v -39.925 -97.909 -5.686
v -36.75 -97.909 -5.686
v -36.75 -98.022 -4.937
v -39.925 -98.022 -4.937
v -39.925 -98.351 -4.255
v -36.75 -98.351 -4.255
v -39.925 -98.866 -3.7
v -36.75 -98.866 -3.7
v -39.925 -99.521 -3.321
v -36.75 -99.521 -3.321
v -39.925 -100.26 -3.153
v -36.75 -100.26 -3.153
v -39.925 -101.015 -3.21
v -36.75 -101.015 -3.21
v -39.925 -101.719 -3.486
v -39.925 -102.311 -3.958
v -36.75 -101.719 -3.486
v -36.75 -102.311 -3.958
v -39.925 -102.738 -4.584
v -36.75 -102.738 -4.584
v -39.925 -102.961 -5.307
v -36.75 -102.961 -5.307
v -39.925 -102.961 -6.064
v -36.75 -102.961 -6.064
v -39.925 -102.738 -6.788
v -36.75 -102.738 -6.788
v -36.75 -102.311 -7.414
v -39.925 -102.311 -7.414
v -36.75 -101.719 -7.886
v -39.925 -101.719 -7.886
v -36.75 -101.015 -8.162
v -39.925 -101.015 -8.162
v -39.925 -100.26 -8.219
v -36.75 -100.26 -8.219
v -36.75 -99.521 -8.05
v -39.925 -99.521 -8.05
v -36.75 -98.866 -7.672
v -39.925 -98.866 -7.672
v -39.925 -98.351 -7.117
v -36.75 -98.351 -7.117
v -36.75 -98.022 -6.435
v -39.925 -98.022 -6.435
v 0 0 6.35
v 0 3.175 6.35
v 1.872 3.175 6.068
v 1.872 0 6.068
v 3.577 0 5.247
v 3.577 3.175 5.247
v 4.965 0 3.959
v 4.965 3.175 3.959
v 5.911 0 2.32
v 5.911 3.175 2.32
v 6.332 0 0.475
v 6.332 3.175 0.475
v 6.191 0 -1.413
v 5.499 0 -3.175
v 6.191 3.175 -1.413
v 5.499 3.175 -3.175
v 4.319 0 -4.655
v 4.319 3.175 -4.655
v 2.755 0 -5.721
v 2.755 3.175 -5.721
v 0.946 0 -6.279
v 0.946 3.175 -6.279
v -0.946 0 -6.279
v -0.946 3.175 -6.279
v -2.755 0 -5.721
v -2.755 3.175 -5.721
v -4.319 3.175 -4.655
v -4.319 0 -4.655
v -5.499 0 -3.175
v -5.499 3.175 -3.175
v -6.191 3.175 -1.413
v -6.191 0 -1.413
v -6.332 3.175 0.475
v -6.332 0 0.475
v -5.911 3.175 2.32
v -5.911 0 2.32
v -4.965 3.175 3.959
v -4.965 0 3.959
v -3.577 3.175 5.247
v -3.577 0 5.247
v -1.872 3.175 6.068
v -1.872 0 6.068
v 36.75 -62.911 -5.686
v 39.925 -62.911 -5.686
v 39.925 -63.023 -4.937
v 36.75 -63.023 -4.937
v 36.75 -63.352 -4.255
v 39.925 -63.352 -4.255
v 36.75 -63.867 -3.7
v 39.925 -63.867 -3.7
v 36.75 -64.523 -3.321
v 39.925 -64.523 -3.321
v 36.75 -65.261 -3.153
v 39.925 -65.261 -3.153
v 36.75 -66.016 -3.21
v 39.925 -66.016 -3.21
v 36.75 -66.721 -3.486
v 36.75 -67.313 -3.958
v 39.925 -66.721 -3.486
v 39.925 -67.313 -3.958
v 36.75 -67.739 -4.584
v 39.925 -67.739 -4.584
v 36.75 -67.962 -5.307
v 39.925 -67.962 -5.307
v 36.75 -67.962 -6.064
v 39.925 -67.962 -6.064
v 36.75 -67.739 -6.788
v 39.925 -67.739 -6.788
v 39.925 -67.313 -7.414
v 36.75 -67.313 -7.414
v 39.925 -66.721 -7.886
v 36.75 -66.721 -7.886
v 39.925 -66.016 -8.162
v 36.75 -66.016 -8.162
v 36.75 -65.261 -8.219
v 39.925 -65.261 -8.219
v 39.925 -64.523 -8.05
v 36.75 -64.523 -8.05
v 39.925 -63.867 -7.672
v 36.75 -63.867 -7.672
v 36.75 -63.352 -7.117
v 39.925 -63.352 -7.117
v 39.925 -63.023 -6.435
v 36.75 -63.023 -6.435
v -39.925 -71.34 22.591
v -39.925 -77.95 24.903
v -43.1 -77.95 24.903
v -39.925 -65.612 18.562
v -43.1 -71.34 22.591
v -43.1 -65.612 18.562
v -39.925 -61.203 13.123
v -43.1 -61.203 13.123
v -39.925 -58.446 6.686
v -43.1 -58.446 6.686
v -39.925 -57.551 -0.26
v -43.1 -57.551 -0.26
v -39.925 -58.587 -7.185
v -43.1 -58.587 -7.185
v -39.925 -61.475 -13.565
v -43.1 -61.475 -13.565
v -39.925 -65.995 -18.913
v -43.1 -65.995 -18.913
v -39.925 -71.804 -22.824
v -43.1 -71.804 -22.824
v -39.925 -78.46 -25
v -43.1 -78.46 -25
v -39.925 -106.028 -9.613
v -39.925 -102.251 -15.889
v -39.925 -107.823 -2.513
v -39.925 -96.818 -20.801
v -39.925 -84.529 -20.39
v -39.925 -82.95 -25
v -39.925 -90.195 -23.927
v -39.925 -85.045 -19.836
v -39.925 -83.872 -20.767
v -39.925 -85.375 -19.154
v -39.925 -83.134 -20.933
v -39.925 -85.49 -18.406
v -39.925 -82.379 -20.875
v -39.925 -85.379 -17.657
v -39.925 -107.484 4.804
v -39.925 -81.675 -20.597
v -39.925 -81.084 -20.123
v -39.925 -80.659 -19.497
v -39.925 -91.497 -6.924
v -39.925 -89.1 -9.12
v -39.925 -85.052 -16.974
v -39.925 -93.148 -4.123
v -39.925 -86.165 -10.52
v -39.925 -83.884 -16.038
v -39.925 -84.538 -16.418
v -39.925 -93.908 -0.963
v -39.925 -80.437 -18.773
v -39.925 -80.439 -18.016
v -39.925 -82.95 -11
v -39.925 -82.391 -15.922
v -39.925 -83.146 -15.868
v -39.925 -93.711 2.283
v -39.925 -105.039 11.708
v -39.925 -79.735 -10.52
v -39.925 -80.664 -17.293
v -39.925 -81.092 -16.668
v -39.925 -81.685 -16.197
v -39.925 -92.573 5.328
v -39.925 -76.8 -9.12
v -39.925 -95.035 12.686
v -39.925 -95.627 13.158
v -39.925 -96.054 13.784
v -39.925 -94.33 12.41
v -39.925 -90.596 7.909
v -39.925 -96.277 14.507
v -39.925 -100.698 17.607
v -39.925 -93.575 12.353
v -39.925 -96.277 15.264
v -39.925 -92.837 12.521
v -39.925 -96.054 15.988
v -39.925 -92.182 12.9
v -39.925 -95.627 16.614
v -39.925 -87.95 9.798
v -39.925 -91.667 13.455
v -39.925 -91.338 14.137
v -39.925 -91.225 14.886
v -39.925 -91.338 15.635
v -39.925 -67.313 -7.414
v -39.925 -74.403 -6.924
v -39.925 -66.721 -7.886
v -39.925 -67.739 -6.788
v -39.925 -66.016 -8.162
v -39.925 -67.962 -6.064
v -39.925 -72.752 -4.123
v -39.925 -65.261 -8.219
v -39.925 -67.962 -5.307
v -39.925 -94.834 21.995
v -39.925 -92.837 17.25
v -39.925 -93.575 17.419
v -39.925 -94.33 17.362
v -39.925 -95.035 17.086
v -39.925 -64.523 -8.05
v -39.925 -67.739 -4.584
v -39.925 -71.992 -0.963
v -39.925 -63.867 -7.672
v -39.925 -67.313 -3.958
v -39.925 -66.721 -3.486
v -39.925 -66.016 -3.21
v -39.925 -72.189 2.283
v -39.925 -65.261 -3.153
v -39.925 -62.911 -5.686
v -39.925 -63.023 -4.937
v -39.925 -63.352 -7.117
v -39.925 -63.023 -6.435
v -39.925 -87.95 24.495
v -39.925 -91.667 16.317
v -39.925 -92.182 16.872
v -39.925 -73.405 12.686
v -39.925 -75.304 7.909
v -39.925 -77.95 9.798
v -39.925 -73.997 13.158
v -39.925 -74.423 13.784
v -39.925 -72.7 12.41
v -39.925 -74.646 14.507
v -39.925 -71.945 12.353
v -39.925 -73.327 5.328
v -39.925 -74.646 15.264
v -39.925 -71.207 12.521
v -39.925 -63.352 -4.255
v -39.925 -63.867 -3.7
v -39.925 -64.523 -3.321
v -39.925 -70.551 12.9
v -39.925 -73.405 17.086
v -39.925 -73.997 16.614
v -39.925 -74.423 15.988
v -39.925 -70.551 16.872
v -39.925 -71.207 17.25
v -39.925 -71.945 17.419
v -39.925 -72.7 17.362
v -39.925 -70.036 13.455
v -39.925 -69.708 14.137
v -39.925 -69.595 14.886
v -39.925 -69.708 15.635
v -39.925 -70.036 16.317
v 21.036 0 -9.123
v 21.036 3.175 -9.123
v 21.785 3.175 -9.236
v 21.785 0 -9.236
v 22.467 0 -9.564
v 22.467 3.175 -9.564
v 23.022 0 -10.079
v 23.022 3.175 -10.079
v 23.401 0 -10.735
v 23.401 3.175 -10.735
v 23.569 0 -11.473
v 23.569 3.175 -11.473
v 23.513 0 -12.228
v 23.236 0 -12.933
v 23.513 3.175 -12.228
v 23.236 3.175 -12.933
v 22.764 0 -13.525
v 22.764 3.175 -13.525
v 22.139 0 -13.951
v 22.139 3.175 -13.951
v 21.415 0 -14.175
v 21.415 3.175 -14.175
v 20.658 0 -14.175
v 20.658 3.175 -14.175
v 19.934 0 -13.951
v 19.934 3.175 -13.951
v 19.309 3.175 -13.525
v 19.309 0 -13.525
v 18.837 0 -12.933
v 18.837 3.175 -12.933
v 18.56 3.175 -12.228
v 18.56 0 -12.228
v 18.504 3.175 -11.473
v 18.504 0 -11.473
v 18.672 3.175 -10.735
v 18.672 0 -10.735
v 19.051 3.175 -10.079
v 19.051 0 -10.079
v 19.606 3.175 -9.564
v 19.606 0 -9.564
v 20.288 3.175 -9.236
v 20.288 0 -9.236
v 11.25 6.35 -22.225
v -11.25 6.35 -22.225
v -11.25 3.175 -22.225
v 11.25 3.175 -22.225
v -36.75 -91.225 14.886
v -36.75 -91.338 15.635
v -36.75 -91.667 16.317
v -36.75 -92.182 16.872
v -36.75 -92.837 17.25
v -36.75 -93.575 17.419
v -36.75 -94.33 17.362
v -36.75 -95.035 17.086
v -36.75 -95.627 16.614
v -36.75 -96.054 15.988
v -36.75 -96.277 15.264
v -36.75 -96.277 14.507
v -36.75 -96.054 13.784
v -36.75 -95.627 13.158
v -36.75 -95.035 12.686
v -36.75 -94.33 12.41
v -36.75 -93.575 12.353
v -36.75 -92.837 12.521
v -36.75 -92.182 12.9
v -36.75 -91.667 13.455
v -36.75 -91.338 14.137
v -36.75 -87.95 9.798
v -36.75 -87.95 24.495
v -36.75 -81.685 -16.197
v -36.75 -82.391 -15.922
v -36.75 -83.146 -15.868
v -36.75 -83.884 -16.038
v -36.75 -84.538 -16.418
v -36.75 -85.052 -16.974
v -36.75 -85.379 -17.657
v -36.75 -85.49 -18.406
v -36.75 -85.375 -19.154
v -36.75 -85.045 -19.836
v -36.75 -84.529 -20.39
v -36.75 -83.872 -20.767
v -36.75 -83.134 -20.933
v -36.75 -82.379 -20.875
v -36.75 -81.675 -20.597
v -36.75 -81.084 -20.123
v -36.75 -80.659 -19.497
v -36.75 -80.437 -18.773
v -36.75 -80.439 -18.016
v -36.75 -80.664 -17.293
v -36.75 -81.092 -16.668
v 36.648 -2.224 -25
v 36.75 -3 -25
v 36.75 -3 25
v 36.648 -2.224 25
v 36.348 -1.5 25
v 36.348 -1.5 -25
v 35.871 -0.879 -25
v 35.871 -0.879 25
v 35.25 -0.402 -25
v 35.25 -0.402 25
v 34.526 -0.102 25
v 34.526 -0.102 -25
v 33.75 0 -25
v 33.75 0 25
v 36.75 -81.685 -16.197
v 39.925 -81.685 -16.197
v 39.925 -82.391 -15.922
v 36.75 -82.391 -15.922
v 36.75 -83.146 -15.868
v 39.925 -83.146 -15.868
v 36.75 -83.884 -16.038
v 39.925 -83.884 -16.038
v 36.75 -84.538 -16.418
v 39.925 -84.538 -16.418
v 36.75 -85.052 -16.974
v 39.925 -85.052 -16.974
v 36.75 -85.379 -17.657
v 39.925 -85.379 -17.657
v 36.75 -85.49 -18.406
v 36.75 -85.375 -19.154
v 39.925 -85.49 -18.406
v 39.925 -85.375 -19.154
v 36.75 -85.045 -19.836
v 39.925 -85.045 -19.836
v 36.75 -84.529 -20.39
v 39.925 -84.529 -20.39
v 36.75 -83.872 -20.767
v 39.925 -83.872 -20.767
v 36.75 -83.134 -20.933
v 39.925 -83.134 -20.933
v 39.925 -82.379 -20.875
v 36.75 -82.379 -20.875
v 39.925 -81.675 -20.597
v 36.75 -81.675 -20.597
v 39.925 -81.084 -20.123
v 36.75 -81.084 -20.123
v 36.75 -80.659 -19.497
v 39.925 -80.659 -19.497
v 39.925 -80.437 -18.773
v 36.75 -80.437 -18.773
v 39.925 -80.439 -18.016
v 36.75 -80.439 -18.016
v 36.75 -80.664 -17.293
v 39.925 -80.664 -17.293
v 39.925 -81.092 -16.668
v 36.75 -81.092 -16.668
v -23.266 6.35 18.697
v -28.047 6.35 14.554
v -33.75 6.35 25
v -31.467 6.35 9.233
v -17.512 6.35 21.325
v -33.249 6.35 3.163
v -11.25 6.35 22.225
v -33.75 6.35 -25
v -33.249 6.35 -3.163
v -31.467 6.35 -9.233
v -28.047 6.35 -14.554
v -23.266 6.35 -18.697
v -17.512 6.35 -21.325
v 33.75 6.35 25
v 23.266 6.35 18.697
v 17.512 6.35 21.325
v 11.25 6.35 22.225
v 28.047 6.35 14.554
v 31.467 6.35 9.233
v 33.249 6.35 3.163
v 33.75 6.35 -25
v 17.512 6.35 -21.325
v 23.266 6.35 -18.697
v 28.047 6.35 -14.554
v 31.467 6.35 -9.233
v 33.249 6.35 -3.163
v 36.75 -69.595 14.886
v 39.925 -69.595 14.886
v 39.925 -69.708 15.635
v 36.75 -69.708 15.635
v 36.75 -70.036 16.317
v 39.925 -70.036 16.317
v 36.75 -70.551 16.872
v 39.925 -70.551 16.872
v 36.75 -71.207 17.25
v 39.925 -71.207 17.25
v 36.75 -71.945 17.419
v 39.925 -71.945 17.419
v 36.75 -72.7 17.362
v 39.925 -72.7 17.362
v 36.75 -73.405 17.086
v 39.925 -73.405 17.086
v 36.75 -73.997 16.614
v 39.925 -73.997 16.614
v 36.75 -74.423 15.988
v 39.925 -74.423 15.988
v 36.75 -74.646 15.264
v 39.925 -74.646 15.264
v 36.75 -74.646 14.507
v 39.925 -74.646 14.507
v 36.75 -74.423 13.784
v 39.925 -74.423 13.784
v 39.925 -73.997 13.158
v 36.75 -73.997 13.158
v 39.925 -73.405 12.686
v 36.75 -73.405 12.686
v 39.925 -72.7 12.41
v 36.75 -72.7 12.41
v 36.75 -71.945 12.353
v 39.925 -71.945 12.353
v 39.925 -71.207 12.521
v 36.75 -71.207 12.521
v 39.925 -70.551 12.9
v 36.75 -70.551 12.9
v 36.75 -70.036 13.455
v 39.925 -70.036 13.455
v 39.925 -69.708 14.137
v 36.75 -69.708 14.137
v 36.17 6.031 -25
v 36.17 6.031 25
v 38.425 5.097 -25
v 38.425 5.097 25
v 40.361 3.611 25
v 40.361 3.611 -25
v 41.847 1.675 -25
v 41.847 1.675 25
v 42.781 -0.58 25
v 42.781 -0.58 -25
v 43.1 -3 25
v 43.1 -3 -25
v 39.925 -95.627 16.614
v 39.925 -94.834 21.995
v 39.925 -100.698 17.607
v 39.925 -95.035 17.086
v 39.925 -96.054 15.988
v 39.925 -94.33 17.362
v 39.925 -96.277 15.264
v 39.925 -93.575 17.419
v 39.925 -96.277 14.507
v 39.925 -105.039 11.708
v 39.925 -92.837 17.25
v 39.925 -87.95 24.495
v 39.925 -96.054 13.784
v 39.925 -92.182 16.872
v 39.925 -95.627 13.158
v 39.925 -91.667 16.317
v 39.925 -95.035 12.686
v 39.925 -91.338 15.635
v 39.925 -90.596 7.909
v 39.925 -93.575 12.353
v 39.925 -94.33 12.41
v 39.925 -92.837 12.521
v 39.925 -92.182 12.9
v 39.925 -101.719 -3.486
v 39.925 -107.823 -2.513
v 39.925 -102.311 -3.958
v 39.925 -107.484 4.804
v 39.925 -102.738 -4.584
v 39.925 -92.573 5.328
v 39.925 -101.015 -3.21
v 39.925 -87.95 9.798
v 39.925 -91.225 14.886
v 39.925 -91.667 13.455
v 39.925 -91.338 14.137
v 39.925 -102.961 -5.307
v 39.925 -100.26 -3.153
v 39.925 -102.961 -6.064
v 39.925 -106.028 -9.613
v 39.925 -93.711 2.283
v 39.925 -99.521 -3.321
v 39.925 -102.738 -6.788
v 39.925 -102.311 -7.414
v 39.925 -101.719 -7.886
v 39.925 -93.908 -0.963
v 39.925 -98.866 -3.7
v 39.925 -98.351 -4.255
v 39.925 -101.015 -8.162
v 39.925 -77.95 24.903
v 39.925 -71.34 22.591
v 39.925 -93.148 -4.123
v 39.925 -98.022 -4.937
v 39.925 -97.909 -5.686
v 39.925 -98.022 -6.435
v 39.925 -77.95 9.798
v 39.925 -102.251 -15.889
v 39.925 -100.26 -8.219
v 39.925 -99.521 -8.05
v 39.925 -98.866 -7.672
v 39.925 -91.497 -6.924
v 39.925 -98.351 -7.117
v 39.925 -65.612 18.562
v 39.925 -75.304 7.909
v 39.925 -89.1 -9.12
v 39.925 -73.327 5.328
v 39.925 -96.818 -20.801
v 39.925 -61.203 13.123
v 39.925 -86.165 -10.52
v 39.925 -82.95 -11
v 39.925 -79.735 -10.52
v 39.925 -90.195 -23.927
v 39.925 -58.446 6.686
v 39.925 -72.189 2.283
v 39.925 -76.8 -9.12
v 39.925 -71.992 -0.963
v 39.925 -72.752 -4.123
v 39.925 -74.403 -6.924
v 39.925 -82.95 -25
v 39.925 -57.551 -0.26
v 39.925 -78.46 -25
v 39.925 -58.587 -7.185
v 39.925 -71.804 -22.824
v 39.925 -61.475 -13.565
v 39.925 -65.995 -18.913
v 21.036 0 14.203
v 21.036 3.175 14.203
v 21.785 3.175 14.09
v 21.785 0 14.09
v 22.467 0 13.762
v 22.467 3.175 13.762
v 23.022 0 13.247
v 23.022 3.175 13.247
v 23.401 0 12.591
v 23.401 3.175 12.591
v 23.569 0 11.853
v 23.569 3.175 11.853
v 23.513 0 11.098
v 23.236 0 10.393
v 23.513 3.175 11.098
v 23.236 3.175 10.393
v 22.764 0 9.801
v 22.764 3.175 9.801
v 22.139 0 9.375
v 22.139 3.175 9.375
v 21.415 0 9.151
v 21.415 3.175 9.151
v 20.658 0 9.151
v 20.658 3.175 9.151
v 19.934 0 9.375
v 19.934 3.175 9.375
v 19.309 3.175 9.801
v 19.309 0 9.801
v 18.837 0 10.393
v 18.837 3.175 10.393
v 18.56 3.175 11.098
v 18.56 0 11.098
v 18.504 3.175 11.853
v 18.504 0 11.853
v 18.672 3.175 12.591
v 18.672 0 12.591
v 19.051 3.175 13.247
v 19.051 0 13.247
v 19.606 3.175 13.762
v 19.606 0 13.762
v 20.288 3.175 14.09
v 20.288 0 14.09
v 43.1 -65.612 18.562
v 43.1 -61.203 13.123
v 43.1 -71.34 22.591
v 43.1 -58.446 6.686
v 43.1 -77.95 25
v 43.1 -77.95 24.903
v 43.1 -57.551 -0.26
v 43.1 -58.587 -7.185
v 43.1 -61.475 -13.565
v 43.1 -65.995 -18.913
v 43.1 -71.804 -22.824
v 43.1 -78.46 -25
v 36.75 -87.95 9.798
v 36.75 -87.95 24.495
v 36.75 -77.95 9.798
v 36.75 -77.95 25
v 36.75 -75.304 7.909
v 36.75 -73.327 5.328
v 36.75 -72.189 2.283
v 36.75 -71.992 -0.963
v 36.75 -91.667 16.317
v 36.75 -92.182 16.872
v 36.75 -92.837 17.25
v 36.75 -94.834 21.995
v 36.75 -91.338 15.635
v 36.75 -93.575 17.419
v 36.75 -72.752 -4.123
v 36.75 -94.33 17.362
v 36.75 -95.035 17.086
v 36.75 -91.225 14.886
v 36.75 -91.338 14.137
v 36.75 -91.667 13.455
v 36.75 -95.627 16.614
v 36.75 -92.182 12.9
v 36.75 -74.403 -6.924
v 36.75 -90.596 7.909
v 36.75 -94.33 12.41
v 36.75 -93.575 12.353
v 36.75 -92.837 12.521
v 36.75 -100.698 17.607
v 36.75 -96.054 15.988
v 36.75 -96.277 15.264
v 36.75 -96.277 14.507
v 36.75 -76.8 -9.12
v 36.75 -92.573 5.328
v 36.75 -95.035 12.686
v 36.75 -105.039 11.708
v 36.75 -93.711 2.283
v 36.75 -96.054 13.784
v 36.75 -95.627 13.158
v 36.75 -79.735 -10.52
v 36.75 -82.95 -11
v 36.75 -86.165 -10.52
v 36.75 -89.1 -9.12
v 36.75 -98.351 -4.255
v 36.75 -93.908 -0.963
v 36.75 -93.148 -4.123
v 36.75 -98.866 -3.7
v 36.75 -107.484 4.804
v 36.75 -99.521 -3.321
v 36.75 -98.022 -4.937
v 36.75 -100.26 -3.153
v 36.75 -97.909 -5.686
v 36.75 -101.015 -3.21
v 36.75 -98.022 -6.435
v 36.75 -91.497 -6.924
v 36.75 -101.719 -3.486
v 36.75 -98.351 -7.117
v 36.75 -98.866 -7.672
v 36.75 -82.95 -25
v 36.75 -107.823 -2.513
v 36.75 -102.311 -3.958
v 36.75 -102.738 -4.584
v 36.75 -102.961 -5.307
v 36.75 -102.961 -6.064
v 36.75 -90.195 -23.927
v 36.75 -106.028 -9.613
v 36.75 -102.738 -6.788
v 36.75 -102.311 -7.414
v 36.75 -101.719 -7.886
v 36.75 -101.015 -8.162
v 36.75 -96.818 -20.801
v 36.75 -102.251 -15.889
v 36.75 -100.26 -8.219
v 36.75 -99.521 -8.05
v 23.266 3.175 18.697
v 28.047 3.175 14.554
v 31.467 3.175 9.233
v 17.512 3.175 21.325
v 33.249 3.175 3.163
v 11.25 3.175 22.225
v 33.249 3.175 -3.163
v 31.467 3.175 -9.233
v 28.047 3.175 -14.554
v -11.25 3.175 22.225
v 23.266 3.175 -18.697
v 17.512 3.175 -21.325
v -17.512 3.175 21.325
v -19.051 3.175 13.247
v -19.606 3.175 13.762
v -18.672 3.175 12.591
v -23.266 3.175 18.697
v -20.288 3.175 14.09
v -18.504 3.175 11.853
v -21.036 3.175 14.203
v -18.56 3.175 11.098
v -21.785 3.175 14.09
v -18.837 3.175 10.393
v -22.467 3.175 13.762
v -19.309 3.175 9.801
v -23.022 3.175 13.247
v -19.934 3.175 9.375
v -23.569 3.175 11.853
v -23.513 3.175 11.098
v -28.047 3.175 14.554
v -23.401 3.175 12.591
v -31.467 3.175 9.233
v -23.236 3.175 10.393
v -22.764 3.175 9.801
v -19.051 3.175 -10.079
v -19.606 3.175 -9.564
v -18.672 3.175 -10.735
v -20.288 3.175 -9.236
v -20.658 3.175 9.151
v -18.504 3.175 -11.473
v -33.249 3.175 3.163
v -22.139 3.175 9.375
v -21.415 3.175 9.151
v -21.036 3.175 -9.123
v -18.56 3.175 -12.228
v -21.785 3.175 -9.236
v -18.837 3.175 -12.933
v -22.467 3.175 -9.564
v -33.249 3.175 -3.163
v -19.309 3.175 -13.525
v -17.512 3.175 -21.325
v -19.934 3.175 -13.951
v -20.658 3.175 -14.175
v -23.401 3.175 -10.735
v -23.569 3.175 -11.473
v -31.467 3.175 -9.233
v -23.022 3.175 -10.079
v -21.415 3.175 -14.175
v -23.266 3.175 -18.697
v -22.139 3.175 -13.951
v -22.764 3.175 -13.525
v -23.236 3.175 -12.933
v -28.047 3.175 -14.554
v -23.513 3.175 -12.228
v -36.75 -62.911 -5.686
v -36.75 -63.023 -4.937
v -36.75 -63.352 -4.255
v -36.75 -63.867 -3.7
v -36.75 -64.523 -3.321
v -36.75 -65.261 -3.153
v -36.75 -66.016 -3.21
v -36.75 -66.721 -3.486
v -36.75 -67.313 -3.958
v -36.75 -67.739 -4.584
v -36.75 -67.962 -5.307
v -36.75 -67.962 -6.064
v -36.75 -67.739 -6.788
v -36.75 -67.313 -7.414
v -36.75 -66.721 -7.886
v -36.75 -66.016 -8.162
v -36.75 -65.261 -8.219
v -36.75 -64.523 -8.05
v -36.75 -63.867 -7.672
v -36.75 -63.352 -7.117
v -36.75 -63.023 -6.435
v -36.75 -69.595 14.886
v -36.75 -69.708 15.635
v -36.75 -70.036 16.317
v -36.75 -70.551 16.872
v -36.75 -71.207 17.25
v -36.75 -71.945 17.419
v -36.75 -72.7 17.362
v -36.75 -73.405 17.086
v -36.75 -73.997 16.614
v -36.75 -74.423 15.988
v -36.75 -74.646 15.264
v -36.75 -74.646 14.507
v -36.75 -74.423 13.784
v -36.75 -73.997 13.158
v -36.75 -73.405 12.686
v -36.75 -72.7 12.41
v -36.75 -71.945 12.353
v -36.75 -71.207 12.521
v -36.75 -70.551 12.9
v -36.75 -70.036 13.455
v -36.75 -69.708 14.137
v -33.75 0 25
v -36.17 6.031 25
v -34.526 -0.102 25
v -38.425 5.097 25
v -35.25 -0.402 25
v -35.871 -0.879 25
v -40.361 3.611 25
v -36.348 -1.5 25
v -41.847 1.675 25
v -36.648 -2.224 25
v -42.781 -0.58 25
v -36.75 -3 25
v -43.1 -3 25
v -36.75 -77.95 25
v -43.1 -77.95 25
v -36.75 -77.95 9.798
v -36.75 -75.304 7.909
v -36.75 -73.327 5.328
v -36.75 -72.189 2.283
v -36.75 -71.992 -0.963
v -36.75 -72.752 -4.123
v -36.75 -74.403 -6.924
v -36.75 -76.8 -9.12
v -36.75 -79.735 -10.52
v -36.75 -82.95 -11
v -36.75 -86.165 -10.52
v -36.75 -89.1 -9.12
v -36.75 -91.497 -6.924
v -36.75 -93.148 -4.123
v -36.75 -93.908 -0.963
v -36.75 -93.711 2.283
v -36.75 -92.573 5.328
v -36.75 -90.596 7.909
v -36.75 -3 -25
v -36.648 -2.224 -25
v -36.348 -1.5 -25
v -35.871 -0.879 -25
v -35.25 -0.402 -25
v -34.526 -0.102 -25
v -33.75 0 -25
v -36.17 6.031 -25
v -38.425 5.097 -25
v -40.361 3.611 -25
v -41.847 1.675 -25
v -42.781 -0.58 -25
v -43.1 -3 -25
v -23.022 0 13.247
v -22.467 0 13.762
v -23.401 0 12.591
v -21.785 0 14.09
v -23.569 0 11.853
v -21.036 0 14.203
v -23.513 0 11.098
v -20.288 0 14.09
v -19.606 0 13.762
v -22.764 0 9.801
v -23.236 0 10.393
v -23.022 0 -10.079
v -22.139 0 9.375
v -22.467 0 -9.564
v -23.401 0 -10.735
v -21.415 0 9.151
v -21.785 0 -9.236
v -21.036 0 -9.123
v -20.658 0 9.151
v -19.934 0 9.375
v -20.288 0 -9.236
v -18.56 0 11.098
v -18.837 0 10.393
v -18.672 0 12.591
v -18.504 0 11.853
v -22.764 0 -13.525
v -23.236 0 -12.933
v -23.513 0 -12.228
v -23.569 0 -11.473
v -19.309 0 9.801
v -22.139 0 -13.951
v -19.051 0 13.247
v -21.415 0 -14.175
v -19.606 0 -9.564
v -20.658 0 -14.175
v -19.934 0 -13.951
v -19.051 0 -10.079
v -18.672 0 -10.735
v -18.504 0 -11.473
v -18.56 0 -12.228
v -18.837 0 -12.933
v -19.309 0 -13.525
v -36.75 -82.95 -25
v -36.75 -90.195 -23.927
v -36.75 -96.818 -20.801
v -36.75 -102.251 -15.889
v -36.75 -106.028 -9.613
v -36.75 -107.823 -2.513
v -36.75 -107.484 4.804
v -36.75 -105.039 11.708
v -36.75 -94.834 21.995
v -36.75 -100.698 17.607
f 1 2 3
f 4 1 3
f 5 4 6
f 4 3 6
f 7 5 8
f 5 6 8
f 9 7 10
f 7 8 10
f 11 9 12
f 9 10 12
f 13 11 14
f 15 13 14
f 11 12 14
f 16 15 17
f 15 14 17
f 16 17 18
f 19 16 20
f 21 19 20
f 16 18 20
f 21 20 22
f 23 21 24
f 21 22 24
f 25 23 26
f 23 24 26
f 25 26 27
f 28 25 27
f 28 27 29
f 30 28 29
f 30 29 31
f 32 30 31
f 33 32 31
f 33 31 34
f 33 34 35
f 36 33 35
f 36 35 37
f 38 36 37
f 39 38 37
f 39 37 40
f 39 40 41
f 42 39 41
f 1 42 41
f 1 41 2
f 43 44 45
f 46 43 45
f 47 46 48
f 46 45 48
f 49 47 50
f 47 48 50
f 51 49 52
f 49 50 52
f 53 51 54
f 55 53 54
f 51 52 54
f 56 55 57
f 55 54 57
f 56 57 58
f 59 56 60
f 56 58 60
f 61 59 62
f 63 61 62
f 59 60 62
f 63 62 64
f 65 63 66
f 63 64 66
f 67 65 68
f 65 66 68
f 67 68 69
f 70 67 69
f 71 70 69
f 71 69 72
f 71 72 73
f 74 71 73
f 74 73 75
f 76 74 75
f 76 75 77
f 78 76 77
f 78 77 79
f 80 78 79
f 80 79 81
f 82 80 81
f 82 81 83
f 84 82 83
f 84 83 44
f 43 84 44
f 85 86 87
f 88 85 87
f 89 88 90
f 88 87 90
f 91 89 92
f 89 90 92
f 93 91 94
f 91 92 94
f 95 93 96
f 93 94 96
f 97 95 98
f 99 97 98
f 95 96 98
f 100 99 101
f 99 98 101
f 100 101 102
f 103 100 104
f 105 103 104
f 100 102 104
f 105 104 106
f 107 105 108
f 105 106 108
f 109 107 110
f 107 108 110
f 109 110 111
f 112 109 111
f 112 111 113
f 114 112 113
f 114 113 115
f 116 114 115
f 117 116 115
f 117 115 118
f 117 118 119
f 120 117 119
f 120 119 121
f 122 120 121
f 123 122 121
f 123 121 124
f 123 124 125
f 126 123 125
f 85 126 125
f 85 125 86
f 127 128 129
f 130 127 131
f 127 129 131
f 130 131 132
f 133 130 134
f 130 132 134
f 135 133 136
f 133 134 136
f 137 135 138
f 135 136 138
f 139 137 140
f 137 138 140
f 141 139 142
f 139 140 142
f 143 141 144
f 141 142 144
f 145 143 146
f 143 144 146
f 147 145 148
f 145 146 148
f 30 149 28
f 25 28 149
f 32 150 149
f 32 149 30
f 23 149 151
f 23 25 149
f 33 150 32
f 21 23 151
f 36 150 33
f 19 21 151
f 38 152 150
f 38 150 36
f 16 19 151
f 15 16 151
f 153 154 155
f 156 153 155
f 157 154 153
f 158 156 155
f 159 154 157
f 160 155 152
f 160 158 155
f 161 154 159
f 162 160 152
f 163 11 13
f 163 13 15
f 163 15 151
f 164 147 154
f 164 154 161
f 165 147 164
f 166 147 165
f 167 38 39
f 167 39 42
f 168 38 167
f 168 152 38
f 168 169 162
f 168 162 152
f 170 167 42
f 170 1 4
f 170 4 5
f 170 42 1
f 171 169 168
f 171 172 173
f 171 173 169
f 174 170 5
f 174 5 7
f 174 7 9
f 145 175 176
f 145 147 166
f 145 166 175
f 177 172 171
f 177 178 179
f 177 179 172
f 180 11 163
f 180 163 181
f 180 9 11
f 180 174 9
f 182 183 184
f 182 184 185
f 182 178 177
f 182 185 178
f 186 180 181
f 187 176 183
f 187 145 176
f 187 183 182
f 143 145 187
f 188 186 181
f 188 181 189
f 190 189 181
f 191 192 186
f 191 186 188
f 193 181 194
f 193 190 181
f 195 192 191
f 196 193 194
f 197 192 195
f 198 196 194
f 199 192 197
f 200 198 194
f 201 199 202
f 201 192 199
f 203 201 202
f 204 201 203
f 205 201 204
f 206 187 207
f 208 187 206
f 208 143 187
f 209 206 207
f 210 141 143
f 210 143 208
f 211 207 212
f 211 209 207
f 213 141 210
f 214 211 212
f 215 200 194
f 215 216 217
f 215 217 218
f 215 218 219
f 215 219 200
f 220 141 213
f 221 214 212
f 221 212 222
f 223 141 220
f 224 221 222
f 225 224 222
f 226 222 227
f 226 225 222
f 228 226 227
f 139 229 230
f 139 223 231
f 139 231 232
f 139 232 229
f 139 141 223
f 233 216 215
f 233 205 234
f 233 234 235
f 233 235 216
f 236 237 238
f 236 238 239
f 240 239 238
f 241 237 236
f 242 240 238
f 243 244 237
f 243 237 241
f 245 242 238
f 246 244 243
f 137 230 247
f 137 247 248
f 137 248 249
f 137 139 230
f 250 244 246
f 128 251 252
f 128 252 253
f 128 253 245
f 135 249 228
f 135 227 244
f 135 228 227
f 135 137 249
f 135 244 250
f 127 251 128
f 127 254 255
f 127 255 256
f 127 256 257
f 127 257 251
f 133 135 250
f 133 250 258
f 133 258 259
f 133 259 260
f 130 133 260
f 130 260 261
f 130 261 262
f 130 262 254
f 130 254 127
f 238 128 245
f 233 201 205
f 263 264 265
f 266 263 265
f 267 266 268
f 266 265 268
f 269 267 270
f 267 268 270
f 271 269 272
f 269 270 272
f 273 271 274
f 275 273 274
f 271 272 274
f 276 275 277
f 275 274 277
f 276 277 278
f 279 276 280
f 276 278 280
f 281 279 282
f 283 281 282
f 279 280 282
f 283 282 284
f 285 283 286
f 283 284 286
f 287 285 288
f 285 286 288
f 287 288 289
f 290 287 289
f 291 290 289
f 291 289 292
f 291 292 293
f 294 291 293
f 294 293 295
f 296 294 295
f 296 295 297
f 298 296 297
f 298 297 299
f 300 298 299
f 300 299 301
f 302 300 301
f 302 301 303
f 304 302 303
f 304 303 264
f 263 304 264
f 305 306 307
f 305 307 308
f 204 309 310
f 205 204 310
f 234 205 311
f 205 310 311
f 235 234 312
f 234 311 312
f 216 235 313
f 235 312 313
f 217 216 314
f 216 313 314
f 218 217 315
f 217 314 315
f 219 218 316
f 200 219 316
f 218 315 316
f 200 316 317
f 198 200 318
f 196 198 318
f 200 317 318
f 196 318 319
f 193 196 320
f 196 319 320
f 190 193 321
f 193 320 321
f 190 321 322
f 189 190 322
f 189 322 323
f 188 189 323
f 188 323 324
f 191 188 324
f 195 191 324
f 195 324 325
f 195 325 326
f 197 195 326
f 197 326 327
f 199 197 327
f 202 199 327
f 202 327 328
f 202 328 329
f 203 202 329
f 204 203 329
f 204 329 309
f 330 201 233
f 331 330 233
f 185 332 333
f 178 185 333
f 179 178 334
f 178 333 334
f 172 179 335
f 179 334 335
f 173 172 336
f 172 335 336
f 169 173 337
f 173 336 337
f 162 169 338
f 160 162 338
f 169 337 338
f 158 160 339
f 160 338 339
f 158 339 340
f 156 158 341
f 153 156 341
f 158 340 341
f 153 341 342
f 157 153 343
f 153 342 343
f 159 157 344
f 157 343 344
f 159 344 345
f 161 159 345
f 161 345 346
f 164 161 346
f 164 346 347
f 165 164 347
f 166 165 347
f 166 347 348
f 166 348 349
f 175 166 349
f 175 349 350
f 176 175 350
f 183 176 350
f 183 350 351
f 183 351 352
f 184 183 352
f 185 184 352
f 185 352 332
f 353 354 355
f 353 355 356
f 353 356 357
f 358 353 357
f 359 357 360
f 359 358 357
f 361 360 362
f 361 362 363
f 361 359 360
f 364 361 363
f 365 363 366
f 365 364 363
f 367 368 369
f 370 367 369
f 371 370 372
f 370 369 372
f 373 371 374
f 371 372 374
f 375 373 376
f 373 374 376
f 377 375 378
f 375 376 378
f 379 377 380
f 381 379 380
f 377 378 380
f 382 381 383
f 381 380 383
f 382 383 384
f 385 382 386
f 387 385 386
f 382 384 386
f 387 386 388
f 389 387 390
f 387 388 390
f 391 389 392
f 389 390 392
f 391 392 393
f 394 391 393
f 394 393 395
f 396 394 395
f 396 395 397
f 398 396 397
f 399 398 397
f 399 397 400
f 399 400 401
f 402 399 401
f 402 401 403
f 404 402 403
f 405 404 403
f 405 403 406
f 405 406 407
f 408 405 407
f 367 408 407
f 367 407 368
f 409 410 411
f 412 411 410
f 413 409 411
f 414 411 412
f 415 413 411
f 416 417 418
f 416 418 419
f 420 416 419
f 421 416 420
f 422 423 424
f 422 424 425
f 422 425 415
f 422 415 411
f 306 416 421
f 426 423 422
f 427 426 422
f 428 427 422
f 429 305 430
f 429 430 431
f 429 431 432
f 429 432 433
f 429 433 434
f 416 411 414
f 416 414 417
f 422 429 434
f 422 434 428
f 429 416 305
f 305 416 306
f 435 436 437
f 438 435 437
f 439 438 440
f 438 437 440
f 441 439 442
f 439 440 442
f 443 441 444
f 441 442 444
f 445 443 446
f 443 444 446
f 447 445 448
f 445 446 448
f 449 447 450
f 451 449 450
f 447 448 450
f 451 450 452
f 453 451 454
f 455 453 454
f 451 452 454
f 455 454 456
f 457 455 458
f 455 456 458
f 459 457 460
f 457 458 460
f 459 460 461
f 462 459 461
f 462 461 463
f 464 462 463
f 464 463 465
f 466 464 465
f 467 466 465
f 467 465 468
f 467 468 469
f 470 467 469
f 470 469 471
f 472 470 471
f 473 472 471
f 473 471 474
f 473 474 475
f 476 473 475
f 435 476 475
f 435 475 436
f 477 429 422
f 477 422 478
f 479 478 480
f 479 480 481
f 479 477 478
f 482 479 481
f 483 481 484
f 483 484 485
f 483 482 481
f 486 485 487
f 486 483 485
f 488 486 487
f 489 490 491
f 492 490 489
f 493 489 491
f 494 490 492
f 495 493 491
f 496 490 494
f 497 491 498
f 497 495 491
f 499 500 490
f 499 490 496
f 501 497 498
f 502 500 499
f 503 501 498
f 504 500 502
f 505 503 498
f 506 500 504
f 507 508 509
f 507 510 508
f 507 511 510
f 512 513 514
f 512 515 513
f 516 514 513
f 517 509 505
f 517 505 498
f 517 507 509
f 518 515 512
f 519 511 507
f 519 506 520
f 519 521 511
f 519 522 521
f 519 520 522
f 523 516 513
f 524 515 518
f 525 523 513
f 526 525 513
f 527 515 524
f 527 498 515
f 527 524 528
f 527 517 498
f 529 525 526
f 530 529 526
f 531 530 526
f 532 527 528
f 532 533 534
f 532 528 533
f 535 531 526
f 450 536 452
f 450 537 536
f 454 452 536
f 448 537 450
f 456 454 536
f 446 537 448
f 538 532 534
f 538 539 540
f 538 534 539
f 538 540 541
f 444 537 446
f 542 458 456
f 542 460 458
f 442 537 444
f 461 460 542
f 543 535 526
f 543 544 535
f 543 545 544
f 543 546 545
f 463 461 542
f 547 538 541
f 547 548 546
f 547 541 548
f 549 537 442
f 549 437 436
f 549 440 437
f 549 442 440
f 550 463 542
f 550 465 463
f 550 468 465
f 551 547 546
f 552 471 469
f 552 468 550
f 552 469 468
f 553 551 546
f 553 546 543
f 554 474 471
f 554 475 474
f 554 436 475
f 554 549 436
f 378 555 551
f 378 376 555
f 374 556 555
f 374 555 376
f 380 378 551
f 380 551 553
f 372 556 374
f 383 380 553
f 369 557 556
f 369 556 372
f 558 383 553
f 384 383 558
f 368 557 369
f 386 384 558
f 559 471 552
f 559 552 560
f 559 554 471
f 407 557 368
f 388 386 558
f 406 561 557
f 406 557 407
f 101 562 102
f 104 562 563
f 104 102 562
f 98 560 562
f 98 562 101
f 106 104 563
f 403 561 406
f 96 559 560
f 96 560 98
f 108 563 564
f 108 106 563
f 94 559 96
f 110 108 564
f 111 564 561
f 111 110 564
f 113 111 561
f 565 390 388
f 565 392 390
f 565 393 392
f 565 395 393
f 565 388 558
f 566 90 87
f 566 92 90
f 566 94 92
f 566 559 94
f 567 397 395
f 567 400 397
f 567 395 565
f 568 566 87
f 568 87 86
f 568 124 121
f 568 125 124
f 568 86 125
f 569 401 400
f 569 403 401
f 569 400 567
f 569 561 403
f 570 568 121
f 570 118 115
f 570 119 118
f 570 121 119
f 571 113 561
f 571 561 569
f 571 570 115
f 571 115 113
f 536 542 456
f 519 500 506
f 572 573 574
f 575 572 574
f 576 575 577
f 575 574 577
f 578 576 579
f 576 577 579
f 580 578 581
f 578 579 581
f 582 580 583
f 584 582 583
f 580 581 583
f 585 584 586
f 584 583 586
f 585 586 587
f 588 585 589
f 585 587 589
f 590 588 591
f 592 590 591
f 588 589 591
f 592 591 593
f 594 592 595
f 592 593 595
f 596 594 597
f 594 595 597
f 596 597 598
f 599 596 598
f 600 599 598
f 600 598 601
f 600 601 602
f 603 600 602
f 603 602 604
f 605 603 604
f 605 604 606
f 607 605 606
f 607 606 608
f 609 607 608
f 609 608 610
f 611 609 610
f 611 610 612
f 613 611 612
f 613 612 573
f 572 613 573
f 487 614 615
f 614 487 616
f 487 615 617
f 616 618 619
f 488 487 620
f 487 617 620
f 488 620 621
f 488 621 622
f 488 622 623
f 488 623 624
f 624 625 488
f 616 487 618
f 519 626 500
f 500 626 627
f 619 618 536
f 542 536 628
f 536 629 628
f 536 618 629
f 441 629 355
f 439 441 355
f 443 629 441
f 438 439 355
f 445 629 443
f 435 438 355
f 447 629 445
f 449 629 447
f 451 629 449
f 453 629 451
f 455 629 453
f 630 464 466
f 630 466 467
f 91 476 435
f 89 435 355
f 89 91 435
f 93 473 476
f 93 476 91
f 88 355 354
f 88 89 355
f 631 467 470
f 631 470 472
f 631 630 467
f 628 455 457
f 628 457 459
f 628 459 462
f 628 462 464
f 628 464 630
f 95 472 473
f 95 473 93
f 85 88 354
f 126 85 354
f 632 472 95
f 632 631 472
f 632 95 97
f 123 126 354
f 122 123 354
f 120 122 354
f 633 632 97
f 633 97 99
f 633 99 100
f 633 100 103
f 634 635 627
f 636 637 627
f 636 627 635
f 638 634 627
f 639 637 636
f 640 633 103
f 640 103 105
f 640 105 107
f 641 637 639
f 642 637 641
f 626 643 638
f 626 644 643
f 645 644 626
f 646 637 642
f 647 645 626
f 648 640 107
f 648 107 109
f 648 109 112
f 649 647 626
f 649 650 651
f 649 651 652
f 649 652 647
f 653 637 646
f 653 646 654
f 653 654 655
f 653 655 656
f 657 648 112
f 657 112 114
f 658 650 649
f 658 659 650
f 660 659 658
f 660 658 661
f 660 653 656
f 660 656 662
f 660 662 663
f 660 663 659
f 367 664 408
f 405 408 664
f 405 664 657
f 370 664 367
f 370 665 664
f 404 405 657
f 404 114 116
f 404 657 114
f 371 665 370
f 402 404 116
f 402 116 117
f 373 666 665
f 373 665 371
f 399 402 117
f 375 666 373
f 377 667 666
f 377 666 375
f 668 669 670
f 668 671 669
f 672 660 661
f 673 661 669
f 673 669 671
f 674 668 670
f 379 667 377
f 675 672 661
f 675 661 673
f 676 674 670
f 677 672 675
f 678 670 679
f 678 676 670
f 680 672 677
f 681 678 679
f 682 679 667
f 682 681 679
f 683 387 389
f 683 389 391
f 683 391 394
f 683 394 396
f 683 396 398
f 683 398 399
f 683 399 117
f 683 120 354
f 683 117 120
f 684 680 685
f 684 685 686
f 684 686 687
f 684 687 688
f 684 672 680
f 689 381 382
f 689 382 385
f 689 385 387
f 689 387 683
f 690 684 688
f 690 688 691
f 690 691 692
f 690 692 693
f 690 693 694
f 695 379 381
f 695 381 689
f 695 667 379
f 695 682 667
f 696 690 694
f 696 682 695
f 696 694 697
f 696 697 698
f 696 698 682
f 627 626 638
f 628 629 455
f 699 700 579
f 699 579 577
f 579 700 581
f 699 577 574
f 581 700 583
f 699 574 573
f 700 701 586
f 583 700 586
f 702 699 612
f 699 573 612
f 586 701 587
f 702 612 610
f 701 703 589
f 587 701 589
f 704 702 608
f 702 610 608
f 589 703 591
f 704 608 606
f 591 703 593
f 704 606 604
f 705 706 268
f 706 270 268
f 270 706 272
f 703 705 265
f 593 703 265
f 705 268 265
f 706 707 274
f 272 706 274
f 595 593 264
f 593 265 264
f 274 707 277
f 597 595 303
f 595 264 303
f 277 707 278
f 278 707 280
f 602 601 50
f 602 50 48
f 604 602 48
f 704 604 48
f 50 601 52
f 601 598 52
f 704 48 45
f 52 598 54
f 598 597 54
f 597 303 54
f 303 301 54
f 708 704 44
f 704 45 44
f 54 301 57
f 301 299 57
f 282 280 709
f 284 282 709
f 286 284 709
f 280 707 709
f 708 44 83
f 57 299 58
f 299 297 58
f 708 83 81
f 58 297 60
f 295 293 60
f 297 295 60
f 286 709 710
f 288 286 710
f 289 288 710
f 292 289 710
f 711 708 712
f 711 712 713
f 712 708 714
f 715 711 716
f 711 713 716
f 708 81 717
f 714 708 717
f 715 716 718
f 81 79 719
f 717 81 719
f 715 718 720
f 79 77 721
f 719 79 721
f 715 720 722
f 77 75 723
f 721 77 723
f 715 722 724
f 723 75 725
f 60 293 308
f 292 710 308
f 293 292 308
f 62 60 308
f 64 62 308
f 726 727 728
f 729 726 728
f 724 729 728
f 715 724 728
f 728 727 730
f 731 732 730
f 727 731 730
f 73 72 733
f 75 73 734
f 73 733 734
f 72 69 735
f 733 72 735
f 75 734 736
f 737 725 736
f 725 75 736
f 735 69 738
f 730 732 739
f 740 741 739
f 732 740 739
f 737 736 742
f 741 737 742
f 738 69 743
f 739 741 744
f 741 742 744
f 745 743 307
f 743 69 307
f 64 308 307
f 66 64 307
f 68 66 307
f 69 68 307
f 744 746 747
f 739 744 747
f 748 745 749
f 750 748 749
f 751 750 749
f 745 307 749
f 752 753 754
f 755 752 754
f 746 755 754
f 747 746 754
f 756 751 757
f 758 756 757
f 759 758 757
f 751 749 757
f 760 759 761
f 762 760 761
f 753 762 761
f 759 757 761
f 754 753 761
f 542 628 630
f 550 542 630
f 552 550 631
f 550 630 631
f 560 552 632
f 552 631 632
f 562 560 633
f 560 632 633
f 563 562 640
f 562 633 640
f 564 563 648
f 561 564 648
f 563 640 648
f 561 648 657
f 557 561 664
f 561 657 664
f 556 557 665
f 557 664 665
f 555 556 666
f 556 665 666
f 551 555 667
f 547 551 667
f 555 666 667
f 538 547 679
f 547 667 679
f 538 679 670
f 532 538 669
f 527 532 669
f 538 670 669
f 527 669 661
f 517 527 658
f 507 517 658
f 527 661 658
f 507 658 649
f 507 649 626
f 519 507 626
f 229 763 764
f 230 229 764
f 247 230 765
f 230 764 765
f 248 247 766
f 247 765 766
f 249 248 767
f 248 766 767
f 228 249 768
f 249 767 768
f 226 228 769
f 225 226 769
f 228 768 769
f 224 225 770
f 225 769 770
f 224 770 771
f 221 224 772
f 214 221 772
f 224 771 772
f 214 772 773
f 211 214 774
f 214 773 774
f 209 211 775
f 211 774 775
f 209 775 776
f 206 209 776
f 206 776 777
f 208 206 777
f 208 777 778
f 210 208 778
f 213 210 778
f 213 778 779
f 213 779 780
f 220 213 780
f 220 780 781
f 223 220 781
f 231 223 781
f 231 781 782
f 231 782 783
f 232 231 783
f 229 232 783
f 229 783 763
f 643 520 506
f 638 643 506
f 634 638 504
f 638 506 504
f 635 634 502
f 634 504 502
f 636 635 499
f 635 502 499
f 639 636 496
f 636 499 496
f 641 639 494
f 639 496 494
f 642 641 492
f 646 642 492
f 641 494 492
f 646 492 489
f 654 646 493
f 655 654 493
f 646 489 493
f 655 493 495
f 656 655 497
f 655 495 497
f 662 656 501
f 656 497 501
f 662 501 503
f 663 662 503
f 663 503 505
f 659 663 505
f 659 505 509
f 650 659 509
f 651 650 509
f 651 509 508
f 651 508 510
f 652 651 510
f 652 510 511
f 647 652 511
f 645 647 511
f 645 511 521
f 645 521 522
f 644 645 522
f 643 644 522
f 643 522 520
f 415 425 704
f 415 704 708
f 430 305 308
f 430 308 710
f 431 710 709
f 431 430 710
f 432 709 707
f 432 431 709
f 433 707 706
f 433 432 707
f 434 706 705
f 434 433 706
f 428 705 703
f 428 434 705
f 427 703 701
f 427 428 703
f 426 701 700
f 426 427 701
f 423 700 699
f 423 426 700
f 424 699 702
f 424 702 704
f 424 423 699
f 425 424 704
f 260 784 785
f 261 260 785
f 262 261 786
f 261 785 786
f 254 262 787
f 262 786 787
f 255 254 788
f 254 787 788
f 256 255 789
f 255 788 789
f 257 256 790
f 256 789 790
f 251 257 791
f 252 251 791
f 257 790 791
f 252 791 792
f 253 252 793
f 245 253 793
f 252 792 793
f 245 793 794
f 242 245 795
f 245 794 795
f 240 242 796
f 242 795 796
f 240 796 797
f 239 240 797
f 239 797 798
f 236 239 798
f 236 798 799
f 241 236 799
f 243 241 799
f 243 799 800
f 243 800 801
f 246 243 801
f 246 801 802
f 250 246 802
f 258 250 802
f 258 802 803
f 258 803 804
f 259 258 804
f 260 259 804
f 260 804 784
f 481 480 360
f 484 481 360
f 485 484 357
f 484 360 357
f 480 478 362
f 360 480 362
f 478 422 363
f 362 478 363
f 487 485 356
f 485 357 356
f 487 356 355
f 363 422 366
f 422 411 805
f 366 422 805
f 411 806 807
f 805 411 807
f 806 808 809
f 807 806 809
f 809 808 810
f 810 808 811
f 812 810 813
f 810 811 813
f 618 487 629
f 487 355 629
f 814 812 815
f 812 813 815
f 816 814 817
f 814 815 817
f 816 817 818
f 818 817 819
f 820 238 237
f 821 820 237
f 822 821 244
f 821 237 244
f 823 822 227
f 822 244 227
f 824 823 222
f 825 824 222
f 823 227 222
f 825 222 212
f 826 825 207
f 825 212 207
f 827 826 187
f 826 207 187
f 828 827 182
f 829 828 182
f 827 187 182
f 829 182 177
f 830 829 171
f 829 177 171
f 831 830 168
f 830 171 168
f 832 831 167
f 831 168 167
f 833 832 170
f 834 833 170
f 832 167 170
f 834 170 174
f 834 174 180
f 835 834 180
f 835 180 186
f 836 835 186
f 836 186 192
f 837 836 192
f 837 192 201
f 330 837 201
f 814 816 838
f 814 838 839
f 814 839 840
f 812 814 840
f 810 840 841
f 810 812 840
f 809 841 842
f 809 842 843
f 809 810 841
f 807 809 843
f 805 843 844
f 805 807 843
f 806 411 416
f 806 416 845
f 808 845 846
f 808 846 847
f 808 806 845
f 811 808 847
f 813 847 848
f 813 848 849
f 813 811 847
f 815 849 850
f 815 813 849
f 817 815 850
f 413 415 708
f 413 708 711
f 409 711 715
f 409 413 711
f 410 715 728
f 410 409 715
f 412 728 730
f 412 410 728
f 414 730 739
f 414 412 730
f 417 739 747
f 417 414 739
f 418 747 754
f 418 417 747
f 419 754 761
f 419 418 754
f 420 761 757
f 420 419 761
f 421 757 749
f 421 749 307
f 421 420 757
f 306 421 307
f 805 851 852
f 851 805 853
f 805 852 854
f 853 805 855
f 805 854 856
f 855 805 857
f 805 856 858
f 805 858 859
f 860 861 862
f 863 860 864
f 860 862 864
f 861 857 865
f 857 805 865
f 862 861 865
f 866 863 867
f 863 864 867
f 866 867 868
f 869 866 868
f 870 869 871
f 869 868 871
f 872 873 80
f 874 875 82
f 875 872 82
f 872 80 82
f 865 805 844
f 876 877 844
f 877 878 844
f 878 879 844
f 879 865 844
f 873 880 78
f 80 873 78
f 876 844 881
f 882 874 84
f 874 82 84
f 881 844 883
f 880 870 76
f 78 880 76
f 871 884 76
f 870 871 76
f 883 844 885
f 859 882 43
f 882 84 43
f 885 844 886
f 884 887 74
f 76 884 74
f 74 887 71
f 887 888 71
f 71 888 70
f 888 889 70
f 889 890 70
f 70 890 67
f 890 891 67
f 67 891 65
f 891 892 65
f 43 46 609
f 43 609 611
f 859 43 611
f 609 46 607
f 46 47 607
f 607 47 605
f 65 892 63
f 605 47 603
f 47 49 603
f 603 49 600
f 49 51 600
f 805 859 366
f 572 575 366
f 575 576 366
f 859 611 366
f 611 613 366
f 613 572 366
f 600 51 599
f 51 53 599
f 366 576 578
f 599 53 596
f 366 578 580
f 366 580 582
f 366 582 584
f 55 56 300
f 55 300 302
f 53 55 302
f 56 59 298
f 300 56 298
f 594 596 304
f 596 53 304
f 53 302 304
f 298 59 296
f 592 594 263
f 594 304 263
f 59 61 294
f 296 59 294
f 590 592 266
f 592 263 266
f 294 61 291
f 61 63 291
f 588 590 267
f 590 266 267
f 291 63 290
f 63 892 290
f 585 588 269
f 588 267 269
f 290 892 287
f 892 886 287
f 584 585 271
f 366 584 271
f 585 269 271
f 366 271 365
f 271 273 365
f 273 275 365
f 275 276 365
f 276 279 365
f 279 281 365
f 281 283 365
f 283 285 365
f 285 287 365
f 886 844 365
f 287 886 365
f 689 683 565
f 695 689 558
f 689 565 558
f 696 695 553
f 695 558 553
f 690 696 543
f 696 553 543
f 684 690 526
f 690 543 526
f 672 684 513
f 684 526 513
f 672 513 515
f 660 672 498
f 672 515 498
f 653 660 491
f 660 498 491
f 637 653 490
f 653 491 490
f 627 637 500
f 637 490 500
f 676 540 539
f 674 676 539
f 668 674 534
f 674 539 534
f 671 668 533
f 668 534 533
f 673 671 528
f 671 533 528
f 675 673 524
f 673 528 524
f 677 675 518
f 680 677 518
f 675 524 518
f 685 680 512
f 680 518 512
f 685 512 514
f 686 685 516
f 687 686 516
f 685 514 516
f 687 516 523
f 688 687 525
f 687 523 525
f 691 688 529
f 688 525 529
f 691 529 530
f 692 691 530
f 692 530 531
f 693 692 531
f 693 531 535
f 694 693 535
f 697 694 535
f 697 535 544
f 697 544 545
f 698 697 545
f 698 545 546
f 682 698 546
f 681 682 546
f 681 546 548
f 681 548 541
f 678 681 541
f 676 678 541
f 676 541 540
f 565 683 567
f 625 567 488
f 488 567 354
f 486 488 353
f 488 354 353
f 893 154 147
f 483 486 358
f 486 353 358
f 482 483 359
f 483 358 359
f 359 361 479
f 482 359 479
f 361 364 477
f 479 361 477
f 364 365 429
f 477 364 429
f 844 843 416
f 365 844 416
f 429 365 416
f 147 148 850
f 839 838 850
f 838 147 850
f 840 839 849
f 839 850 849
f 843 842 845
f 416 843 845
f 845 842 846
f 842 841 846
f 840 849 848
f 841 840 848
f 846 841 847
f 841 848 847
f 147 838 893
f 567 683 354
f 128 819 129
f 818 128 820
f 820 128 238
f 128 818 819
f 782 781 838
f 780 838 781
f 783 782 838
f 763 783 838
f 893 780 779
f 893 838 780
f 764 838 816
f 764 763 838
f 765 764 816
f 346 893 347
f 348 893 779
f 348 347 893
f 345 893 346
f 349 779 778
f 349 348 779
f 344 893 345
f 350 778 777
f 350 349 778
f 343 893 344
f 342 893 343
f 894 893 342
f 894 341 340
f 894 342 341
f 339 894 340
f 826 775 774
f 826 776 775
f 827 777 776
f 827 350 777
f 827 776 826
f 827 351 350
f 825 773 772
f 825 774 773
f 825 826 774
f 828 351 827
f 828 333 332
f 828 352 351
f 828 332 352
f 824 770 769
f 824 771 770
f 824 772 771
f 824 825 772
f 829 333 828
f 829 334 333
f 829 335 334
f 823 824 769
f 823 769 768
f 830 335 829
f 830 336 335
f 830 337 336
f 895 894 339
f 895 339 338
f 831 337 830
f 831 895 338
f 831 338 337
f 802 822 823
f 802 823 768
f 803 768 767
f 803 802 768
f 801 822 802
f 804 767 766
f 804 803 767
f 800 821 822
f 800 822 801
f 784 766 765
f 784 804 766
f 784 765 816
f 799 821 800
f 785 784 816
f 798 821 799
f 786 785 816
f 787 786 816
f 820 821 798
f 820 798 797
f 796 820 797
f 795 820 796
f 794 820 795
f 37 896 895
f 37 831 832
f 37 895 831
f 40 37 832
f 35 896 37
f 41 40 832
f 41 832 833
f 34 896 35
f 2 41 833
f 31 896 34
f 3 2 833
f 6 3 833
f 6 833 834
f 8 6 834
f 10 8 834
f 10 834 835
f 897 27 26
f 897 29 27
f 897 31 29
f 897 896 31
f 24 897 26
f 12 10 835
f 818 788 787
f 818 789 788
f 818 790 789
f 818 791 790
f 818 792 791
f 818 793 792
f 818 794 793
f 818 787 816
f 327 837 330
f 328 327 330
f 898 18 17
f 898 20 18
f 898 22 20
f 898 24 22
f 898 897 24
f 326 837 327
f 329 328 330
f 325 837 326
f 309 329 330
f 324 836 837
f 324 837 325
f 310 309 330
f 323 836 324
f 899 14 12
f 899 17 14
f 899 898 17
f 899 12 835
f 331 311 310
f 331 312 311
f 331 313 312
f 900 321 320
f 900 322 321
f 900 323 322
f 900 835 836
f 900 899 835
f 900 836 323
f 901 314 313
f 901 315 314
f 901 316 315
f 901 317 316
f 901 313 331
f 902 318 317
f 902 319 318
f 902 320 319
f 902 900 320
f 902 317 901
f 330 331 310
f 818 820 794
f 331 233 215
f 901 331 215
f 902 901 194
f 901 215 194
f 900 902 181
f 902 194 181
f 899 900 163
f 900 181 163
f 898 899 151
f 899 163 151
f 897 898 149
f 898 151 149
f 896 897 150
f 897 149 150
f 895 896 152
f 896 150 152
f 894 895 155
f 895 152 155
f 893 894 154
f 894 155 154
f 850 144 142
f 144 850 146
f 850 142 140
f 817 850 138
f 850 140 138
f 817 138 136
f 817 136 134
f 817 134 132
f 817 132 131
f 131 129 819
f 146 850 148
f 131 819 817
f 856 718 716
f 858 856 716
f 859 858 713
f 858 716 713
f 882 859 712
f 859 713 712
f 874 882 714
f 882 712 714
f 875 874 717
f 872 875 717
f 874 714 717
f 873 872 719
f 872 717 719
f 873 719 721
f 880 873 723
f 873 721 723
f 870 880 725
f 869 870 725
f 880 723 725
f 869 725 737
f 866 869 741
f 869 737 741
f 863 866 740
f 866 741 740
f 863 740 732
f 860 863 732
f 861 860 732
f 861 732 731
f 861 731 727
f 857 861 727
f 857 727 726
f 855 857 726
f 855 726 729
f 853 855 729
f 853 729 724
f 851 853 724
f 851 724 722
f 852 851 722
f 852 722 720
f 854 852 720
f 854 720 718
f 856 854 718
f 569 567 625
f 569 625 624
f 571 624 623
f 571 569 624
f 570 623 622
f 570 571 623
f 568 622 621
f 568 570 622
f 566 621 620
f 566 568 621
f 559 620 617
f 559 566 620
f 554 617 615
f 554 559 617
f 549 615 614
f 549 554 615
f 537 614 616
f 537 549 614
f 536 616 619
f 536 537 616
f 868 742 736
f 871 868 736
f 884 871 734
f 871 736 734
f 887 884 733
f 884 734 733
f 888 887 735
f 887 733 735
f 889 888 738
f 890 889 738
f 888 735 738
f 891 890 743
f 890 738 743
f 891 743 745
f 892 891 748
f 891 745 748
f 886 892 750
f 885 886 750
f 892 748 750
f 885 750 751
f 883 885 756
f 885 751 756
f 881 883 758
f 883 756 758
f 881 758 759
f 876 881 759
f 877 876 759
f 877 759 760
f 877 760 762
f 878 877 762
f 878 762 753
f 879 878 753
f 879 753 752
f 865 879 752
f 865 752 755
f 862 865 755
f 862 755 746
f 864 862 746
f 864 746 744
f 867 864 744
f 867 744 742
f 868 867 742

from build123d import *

# Parameters (mm, degrees)
SKETCH1_W                 = 67.5
SKETCH1_H                 = 50
BOSS_EXTRUDE1_DEPTH       = 6.35
EDGE_FLANGE1_DEPTH        = 50
EDGE_FLANGE1_START        = -6.35
EDGE_FLANGE1_FLAT_DEPTH   = 6.35
EDGE_FLANGE1_BEND_DEPTH   = 50
EDGE_FLANGE1_FLAT_2_DEPTH = 6.35
CUT_EXTRUDE1_DEPTH        = 141.387472732
CUT_EXTRUDE3_DEPTH        = 3.175
SKETCH16_R                = 2.54
CUT_EXTRUDE4_DEPTH        = 122.784135358
SKETCH17_R                = 6.35
CUT_EXTRUDE5_DEPTH        = 122.784135358
SKETCH18_R                = 25.4
CUT_EXTRUDE6_DEPTH        = 3.175
CUT_EXTRUDE7_START        = -3.175
SKETCH19_R                = 25.4
CUT_EXTRUDE7_DEPTH        = 3.175
SKETCH20_R                = 2.54
CUT_EXTRUDE8_DEPTH        = 139.460655513


# Sheet-metal steps are written as plain solids
with BuildPart() as part:
    # Sketch1 → Boss-Extrude1 (new body)
    with BuildSketch(Plane(origin=(0, 0, 0), x_dir=(1, 0, 0), z_dir=(0, 1, 0))):
        Rectangle(SKETCH1_W, SKETCH1_H)
    extrude(amount=BOSS_EXTRUDE1_DEPTH)

    # Edge-Flange1 bend section (across the edge) → Edge-Flange1 (add)
    with BuildSketch(Plane(origin=(36.75, 0, -25), x_dir=(-1, 0, 0), z_dir=(0, 0, 1))):
        with BuildLine():
            Line((-6.35, 3), (0, 3))
            ThreePointArc((0, 3), (0.878679656, 0.878679656), (3, 0))
            Line((3, 0), (3, -6.35))
            ThreePointArc((3, -6.35), (-3.611448404, -3.611448404), (-6.35, 3))
        make_face()
    extrude(amount=EDGE_FLANGE1_DEPTH)

    # Edge-Flange1 profile (on flange) → Edge-Flange1 flat (add)
    with BuildSketch(Plane(origin=(36.75, 0, 0), x_dir=(0, 0, -1), z_dir=(-1, 0, 0)).offset(EDGE_FLANGE1_START)):
        with BuildLine():
            ThreePointArc((25, 82.95), (0, 107.95), (-25, 82.95))
            Line((-25, 82.95), (-25, 3))
            Line((-25, 3), (25, 3))
            Line((25, 3), (25, 82.95))
        make_face()
    extrude(amount=EDGE_FLANGE1_FLAT_DEPTH)

    # Edge-Flange1 bend section 2 (across the edge) → Edge-Flange1 bend (add)
    with BuildSketch(Plane(origin=(-36.75, 0, 25), x_dir=(1, 0, 0), z_dir=(0, 0, -1))):
        with BuildLine():
            Line((-6.35, 3), (0, 3))
            ThreePointArc((0, 3), (0.878679656, 0.878679656), (3, 0))
            Line((3, 0), (3, -6.35))
            ThreePointArc((3, -6.35), (-3.611448404, -3.611448404), (-6.35, 3))
        make_face()
    extrude(amount=EDGE_FLANGE1_BEND_DEPTH)

    # Edge-Flange1 profile 2 (on flange) → Edge-Flange1 flat 2 (add)
    with BuildSketch(Plane(origin=(-36.75, 0, 0), x_dir=(0, 0, 1), z_dir=(1, 0, 0)).offset(EDGE_FLANGE1_START)):
        with BuildLine():
            ThreePointArc((25, 82.95), (0, 107.95), (-25, 82.95))
            Line((-25, 82.95), (-25, 3))
            Line((-25, 3), (25, 3))
            Line((25, 3), (25, 82.95))
        make_face()
    extrude(amount=EDGE_FLANGE1_FLAT_2_DEPTH)

    # Sketch13 → Cut-Extrude1 (cut, through all)
    with BuildSketch(Plane.ZY.offset(43.1)):
        with BuildLine():
            Line((9.797958971, -87.95), (25, -87.95))
            Line((25, -87.95), (25, -77.95))
            Line((25, -77.95), (9.797958971, -77.95))
            ThreePointArc((9.797958971, -77.95), (-11, -82.95), (9.797958971, -87.95))
        make_face()
    extrude(amount=-CUT_EXTRUDE1_DEPTH, mode=Mode.SUBTRACT)

    # Sketch15 → Cut-Extrude3 (cut)
    with BuildSketch(Plane(origin=(0, 6.35, 0), x_dir=(1, 0, 0), z_dir=(0, 1, 0))):
        with BuildLine():
            Line((-11.25, 22.225), (11.25, 22.225))
            ThreePointArc((11.25, 22.225), (33.475, 0), (11.25, -22.225))
            Line((11.25, -22.225), (-11.25, -22.225))
            ThreePointArc((-11.25, -22.225), (-33.475, 0), (-11.25, 22.225))
        make_face()
    extrude(amount=-CUT_EXTRUDE3_DEPTH, mode=Mode.SUBTRACT)

    # Sketch16 → Cut-Extrude4 (cut, through all)
    with BuildSketch(Plane(origin=(0, 3.175, 0), x_dir=(1, 0, 0), z_dir=(0, 1, 0))):
        with Locations(Location((-21.036441357, -11.663026646, 0), (0, 0, 270))):
            Circle(SKETCH16_R)
        with Locations(Location((-21.036441357, 11.663026646, 0), (0, 0, 270))):
            Circle(SKETCH16_R)
        with Locations(Location((21.036441357, 11.663026646, 0), (0, 0, 270))):
            Circle(SKETCH16_R)
        with Locations(Location((21.036441357, -11.663026646, 0), (0, 0, 270))):
            Circle(SKETCH16_R)
    extrude(amount=-CUT_EXTRUDE4_DEPTH, mode=Mode.SUBTRACT)

    # Sketch17 → Cut-Extrude5 (cut, through all)
    with BuildSketch(Plane(origin=(0, 3.175, 0), x_dir=(1, 0, 0), z_dir=(0, 1, 0))):
        with Locations(Location((0, 0, 0), (0, 0, 270))):
            Circle(SKETCH17_R)
    extrude(amount=-CUT_EXTRUDE5_DEPTH, mode=Mode.SUBTRACT)

    # Sketch18 → Cut-Extrude6 (cut)
    with BuildSketch(Plane.ZY.offset(43.1)):
        with Locations((0, -82.95)):
            Circle(SKETCH18_R)
    extrude(amount=-CUT_EXTRUDE6_DEPTH, mode=Mode.SUBTRACT)

    # Sketch19 → Cut-Extrude7 (cut)
    with BuildSketch(Plane(origin=(43.1, 0, 0), x_dir=(0, 0, -1), z_dir=(1, 0, 0)).offset(CUT_EXTRUDE7_START)):
        with Locations((0, -82.95)):
            Circle(SKETCH19_R)
    extrude(amount=CUT_EXTRUDE7_DEPTH, mode=Mode.SUBTRACT)

    # Sketch20 → Cut-Extrude8 (cut, through all)
    with BuildSketch(Plane(origin=(39.925, 0, 0), x_dir=(0, 0, -1), z_dir=(1, 0, 0))):
        with Locations(Location((18.4, -82.95, 0), (0, 0, 150.134638176))):
            Circle(SKETCH20_R)
        with Locations(Location((5.685912696, -100.4494399, 0), (0, 0, 90))):
            Circle(SKETCH20_R)
        with Locations(Location((-14.885912696, -93.765248642, 0), (0, 0, 90))):
            Circle(SKETCH20_R)
        with Locations(Location((-14.885912696, -72.134751358, 0), (0, 0, 90))):
            Circle(SKETCH20_R)
        with Locations(Location((5.685912696, -65.4505601, 0), (0, 0, 90))):
            Circle(SKETCH20_R)
    extrude(amount=-CUT_EXTRUDE8_DEPTH, mode=Mode.SUBTRACT)


solid = part.part
